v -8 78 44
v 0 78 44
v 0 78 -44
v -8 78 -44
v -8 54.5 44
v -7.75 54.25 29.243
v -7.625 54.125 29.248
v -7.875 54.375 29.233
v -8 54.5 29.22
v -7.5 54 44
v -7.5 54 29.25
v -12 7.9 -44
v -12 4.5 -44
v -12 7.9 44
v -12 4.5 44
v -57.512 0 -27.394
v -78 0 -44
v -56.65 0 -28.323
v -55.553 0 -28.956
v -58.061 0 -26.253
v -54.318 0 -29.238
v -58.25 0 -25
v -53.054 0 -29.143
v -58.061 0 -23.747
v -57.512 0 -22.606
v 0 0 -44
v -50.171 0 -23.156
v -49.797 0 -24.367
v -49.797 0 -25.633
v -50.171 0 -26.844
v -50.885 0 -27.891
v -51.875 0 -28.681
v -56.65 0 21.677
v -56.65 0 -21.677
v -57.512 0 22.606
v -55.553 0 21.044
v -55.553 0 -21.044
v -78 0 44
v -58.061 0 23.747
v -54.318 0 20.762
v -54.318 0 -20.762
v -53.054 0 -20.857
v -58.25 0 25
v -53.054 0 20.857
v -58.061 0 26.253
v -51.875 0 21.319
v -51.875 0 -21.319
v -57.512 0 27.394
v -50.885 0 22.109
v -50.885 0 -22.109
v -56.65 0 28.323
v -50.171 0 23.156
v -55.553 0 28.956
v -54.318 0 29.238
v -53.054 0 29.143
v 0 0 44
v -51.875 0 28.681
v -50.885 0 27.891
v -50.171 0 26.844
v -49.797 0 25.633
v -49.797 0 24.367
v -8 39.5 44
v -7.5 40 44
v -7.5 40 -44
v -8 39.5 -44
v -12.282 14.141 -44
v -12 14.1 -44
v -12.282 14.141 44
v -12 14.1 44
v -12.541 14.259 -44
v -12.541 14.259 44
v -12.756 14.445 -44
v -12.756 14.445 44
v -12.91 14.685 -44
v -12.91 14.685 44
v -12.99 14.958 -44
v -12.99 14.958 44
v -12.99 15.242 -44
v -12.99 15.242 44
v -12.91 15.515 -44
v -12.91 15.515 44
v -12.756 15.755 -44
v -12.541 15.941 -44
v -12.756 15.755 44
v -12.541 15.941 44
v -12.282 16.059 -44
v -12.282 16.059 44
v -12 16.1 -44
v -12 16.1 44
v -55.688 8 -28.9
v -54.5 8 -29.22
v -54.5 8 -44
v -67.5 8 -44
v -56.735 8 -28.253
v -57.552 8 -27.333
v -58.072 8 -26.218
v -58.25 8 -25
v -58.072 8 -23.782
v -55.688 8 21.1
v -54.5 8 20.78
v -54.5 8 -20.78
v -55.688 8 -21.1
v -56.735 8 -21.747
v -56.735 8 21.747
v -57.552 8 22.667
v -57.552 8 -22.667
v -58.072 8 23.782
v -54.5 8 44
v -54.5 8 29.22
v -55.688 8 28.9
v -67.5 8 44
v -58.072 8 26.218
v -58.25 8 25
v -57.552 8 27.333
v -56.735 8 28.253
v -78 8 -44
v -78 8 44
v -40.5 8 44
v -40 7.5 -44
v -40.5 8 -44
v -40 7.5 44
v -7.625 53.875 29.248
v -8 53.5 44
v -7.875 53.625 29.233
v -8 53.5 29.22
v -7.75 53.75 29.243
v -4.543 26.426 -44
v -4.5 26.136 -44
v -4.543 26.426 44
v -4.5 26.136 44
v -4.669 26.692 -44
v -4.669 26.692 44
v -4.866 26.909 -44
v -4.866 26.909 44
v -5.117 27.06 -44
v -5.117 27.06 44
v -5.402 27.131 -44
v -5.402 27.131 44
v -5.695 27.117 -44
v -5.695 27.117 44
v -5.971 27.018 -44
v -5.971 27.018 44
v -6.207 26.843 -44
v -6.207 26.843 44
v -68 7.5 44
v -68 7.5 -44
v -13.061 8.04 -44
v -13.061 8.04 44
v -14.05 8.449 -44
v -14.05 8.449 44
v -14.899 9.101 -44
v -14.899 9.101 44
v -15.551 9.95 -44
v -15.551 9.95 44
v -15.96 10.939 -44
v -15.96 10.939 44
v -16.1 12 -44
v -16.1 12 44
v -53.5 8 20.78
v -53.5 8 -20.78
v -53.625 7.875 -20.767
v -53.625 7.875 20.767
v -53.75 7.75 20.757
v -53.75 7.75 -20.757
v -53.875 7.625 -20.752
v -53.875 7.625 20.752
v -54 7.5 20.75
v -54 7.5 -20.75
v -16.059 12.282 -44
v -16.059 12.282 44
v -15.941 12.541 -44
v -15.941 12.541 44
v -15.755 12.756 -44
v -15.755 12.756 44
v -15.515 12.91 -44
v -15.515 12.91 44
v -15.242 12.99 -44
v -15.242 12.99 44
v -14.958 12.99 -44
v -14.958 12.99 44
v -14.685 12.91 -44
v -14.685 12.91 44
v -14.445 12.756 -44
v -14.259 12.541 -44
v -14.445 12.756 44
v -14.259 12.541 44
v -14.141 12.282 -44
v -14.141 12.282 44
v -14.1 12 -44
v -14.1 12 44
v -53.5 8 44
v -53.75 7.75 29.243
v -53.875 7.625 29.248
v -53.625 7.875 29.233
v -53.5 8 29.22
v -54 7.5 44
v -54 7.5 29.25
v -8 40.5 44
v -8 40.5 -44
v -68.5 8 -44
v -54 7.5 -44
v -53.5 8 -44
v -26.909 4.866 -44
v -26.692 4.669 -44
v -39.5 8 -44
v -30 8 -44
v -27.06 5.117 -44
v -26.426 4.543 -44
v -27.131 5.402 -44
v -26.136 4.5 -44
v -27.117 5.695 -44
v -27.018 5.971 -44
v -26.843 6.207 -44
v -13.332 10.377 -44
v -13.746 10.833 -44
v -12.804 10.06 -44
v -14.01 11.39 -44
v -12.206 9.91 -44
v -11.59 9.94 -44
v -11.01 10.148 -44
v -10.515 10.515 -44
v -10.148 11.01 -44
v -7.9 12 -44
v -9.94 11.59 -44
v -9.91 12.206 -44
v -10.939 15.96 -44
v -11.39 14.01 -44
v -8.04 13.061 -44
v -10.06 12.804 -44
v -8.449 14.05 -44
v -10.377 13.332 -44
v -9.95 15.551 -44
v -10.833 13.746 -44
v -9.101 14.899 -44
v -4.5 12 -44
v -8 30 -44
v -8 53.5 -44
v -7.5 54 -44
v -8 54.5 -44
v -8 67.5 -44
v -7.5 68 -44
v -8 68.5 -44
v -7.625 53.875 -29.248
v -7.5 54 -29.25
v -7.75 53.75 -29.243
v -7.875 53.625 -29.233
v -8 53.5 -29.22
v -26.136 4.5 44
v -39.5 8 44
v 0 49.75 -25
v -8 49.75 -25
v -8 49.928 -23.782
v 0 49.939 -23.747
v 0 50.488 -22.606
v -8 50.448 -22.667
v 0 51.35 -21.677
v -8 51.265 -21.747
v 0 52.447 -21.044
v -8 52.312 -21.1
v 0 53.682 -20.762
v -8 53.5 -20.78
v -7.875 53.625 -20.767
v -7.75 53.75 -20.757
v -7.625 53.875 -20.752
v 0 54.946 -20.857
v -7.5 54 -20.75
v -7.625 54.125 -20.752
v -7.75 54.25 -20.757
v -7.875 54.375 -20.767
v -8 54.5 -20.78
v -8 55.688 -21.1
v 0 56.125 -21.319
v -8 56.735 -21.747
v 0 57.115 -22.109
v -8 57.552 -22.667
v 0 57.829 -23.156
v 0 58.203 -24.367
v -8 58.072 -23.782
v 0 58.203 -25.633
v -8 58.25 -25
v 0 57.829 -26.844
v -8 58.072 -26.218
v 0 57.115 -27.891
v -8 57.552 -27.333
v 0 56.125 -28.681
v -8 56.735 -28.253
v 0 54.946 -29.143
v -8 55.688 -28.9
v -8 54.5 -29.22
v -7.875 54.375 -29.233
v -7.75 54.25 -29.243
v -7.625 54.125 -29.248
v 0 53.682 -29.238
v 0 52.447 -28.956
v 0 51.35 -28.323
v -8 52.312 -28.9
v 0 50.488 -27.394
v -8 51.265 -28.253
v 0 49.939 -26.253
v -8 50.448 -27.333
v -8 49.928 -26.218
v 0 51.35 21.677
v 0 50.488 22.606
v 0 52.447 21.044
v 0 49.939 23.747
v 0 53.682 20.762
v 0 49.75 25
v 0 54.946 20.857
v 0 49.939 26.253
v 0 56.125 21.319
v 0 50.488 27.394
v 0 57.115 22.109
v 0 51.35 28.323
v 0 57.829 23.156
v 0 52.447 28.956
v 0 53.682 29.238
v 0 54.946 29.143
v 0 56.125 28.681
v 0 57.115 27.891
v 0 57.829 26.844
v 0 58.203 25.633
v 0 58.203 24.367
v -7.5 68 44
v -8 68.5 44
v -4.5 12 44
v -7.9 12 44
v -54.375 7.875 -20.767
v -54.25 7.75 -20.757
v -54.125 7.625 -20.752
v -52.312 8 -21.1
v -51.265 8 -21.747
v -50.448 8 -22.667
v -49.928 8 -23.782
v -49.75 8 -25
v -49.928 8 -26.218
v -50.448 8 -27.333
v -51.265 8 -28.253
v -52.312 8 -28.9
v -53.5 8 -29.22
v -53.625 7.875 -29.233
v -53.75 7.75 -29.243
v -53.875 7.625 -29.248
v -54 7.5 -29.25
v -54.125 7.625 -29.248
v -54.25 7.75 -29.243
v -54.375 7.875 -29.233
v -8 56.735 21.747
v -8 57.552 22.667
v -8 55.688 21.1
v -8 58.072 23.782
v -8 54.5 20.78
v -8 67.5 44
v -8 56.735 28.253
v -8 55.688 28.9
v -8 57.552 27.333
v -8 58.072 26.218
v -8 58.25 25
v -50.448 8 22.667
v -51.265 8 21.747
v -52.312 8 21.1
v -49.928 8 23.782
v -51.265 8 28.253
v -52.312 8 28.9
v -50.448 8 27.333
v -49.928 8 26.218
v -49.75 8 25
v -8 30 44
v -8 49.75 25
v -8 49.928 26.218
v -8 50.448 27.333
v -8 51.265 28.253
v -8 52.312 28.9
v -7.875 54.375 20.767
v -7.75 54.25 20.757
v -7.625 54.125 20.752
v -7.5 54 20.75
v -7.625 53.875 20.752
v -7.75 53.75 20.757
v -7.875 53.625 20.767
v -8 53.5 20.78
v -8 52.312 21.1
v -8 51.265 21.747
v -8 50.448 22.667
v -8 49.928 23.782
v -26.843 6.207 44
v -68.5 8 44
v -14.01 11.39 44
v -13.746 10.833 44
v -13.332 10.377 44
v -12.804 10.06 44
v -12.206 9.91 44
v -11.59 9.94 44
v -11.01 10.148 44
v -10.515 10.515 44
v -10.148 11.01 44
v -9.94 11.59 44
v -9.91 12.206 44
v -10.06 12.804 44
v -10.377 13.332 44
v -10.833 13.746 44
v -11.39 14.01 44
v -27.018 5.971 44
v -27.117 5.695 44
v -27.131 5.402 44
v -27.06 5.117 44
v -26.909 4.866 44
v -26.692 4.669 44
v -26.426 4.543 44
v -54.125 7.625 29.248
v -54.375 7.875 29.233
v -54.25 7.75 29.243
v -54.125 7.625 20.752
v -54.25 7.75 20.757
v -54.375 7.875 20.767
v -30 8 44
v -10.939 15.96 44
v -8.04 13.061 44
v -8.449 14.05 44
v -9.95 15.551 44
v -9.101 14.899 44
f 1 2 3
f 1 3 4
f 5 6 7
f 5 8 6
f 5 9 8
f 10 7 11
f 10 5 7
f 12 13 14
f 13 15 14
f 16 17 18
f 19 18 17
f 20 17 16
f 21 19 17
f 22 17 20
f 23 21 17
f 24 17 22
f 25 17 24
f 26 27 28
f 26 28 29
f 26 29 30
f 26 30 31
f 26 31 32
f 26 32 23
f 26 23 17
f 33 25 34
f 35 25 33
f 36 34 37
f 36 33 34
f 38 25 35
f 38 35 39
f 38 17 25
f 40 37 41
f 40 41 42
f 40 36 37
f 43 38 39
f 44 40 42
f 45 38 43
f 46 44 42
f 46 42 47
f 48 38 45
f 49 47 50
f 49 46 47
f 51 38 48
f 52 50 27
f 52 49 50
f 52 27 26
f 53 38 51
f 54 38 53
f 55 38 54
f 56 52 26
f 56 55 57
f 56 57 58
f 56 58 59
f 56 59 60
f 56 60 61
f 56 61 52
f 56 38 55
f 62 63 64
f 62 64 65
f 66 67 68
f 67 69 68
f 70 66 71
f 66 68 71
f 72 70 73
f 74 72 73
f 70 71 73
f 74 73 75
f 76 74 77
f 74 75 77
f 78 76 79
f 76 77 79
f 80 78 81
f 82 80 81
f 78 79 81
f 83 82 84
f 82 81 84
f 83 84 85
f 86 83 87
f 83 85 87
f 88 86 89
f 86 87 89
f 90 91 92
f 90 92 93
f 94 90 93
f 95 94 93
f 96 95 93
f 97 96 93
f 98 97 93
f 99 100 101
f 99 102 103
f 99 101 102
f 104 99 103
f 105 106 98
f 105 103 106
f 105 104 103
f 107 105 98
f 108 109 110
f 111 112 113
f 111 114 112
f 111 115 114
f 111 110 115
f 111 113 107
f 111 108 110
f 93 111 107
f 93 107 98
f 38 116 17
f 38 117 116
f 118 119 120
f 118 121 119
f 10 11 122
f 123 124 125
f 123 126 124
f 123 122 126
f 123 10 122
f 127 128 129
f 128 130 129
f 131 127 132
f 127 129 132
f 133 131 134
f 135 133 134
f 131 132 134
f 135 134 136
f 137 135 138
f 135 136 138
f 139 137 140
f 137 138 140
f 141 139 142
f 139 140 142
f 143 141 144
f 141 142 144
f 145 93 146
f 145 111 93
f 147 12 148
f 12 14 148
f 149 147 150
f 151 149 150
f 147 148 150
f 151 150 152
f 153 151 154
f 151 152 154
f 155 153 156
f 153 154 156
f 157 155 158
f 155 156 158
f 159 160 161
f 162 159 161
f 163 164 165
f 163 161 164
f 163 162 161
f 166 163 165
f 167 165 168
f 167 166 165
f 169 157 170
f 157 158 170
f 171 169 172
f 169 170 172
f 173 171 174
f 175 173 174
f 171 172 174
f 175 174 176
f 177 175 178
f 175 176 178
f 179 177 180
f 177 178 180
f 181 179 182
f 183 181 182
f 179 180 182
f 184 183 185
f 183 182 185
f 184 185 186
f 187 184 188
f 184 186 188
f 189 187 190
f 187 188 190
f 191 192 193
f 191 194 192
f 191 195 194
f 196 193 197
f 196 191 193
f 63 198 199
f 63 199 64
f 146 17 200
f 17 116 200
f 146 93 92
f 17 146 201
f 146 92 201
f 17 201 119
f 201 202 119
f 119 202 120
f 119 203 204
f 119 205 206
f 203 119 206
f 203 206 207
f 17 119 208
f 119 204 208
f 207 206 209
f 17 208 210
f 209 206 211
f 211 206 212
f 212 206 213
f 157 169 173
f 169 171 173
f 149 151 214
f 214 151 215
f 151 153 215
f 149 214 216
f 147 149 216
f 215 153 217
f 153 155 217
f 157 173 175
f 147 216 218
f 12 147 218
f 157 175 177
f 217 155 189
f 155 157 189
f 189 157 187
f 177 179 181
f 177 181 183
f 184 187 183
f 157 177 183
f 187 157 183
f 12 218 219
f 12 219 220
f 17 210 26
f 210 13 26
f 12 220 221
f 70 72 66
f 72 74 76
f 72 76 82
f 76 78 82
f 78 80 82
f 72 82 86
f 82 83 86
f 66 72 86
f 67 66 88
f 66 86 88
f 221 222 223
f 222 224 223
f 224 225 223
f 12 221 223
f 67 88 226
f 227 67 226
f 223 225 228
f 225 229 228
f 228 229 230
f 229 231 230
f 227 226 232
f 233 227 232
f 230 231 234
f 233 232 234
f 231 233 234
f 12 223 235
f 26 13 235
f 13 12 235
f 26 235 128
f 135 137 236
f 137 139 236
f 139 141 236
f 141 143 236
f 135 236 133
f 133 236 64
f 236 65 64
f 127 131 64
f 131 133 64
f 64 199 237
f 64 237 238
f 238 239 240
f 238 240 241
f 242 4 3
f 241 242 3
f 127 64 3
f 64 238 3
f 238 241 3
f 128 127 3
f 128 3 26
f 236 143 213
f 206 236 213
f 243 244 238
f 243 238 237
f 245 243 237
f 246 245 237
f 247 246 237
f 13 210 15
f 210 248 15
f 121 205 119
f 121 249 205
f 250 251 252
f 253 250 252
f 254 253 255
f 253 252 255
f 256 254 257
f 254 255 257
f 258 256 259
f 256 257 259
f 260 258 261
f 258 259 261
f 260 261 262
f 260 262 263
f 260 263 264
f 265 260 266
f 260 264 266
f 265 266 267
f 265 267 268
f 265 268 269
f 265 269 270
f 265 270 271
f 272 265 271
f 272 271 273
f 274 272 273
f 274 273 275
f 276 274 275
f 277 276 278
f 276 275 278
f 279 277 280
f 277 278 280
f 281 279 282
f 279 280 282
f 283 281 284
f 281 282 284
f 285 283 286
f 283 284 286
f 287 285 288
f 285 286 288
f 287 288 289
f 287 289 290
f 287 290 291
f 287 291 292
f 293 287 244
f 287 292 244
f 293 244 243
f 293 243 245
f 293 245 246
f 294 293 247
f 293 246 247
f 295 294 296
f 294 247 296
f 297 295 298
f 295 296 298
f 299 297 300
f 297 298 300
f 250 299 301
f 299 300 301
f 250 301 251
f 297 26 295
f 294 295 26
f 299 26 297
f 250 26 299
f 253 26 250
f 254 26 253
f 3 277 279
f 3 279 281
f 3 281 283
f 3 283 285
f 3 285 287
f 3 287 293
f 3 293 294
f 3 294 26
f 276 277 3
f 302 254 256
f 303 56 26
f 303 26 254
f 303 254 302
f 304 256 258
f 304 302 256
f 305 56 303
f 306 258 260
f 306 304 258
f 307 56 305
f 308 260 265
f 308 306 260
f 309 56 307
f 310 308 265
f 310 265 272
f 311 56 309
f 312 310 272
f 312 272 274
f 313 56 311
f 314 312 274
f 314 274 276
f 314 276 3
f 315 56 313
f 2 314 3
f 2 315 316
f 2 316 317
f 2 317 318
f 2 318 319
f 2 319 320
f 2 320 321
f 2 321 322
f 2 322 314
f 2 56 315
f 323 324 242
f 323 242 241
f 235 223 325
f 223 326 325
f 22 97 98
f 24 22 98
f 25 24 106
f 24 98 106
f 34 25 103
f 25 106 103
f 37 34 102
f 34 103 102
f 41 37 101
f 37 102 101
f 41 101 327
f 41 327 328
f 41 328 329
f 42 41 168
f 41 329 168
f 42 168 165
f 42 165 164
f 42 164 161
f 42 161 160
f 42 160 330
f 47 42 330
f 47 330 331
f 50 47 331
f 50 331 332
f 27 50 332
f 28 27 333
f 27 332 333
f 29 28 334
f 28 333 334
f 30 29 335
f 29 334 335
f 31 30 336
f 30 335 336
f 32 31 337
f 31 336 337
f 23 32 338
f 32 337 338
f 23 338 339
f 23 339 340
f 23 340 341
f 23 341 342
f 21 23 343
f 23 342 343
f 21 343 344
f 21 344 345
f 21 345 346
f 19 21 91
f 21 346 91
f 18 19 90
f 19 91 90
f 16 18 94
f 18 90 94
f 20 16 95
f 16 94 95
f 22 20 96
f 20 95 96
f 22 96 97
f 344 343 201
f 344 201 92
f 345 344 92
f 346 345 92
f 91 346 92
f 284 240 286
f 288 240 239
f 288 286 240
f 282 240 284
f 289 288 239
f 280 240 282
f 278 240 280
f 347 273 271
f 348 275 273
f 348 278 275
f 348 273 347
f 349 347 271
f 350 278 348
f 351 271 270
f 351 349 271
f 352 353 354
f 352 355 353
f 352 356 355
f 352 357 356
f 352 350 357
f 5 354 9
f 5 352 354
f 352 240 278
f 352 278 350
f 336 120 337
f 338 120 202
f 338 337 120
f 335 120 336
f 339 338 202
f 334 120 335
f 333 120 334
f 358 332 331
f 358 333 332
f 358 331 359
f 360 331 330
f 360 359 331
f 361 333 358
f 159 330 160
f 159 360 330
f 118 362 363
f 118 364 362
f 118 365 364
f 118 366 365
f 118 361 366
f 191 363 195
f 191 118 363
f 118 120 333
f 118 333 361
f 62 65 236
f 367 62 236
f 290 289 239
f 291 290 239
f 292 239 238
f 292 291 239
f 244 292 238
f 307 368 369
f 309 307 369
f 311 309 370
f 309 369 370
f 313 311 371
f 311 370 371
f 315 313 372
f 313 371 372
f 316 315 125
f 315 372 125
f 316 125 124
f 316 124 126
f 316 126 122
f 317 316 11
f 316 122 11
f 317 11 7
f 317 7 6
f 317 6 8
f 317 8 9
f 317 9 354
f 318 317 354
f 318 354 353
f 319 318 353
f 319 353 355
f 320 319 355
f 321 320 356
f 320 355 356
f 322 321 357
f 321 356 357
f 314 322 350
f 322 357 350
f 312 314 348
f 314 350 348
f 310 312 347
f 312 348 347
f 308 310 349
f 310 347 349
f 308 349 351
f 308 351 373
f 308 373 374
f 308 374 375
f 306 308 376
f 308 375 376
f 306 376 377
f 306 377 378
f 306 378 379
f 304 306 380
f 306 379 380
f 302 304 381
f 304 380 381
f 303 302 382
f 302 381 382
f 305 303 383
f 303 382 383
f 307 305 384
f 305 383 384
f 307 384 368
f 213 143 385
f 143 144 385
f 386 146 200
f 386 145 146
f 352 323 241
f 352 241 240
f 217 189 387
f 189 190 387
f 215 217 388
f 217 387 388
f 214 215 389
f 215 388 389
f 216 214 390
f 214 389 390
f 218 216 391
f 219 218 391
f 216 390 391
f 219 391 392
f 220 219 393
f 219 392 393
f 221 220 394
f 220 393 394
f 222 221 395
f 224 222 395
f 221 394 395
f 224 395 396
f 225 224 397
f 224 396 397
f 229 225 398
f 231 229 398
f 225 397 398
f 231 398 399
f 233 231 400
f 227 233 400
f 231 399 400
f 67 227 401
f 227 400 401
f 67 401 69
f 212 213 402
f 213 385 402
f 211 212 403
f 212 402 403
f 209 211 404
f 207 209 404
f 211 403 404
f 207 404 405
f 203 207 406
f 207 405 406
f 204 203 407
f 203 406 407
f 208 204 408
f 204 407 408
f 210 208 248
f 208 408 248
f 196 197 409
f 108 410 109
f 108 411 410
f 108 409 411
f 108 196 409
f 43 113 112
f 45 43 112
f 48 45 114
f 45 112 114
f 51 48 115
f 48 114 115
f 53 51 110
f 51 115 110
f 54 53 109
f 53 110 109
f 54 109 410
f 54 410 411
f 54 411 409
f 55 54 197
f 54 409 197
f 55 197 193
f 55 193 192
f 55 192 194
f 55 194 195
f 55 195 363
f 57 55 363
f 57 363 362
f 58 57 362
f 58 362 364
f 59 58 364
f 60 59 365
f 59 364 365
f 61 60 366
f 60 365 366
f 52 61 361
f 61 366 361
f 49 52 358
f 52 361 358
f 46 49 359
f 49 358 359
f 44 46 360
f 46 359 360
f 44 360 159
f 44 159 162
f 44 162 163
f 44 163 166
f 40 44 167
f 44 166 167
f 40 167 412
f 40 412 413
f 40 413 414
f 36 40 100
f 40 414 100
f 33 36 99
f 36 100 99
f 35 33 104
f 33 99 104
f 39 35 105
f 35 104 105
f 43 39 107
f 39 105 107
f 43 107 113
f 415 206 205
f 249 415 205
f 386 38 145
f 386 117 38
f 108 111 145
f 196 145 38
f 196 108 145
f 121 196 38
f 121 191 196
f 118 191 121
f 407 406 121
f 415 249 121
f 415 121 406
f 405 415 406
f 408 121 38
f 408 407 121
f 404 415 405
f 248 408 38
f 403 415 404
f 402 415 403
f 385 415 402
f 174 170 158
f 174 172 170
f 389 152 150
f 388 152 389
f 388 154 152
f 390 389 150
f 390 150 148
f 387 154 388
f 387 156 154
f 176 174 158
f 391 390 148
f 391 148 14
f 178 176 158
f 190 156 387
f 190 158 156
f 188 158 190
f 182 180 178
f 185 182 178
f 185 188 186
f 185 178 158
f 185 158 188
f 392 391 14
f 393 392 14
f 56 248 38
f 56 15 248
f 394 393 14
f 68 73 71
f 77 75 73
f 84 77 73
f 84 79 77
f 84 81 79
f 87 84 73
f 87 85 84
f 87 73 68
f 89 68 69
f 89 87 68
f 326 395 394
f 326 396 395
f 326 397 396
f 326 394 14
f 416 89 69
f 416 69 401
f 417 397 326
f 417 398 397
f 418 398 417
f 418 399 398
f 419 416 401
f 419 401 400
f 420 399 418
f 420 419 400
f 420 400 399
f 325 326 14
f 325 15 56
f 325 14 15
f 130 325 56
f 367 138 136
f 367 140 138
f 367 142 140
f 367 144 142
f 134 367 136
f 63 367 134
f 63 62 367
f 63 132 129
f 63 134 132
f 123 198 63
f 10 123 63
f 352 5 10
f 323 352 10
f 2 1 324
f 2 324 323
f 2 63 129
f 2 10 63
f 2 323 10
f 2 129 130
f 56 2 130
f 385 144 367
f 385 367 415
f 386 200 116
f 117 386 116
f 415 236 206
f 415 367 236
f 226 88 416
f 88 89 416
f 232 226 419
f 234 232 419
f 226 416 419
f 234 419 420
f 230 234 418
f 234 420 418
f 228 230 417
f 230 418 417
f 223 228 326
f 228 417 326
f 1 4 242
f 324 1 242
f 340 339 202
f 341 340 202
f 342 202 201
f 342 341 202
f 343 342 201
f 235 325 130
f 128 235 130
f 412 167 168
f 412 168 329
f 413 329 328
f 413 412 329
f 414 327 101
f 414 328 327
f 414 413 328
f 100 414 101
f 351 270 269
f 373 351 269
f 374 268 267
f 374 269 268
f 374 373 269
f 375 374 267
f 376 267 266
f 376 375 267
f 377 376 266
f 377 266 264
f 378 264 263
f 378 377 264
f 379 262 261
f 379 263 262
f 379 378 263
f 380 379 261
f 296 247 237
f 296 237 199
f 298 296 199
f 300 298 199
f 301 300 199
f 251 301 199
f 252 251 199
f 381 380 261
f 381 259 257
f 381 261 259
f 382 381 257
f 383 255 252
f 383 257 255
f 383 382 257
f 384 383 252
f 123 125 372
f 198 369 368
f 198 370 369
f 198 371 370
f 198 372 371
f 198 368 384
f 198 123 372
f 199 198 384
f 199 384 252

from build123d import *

# Parameters (mm, degrees)
EXTRUDE_1_DEPTH     = 44
SKETCH_2_R          = 4.25
CUT_EXTRUDE_1_DEPTH = 9
SKETCH_3_R          = 4.25
CUT_EXTRUDE_2_DEPTH = 9


with BuildPart() as part:
    # Эскиз1 → Бобышка-Вытянуть1 (new body, symmetric)
    with BuildSketch(Plane.XY):
        Polygon((-78, 0), (0, 0), (0, 78), (-8, 78), (-8, 68.5), (-7.5, 68), (-8, 67.5), (-8, 54.5), (-7.5, 54), (-8, 53.5), (-8, 40.5), (-7.5, 40), (-8, 39.5), (-8, 30), (-30, 8), (-39.5, 8), (-40, 7.5), (-40.5, 8), (-53.5, 8), (-54, 7.5), (-54.5, 8), (-67.5, 8), (-68, 7.5), (-68.5, 8), (-78, 8), align=None)
        with BuildLine():
            Line((-4.5, 12), (-4.5, 26.136038969))
            ThreePointArc((-4.5, 26.136038969), (-5.117316568, 27.059918502), (-6.207106781, 26.843145751))
            Line((-6.207106781, 26.843145751), (-26.843145751, 6.207106781))
            ThreePointArc((-26.843145751, 6.207106781), (-27.059918502, 5.117316568), (-26.136038969, 4.5))
            Line((-26.136038969, 4.5), (-12, 4.5))
            Line((-12, 4.5), (-12, 7.9))
            ThreePointArc((-12, 7.9), (-14.899137803, 9.100862197), (-16.1, 12))
            ThreePointArc((-16.1, 12), (-15.1, 13), (-14.1, 12))
            ThreePointArc((-14.1, 12), (-10.51507576, 10.51507576), (-12, 14.1))
            ThreePointArc((-12, 14.1), (-13, 15.1), (-12, 16.1))
            ThreePointArc((-12, 16.1), (-9.100862197, 14.899137803), (-7.9, 12))
            Line((-7.9, 12), (-4.5, 12))
        make_face(mode=Mode.SUBTRACT)
    extrude(amount=EXTRUDE_1_DEPTH, both=True)

    # Эскиз2 → Вырез-Вытянуть1 (cut, through all)
    with BuildSketch(Plane.ZY.offset(8)):
        with Locations(Location((-25, 54, 0), (0, 0, 270))):  # turned: the seam where the file's is
            Circle(SKETCH_2_R)
        with Locations(Location((25, 54, 0), (0, 0, 270))):  # turned: the seam where the file's is
            Circle(SKETCH_2_R)
    extrude(amount=-CUT_EXTRUDE_1_DEPTH, mode=Mode.SUBTRACT)

    # Эскиз3 → Вырез-Вытянуть2 (cut, through all)
    with BuildSketch(Plane(origin=(0, 8, 0), x_dir=(1, 0, 0), z_dir=(0, 1, 0))):
        with Locations(Location((-54, -25, 0), (0, 0, 180))):  # turned: the seam where the file's is
            Circle(SKETCH_3_R)
        with Locations(Location((-54, 25, 0), (0, 0, 180))):  # turned: the seam where the file's is
            Circle(SKETCH_3_R)
    extrude(amount=-CUT_EXTRUDE_2_DEPTH, mode=Mode.SUBTRACT)


solid = part.part
